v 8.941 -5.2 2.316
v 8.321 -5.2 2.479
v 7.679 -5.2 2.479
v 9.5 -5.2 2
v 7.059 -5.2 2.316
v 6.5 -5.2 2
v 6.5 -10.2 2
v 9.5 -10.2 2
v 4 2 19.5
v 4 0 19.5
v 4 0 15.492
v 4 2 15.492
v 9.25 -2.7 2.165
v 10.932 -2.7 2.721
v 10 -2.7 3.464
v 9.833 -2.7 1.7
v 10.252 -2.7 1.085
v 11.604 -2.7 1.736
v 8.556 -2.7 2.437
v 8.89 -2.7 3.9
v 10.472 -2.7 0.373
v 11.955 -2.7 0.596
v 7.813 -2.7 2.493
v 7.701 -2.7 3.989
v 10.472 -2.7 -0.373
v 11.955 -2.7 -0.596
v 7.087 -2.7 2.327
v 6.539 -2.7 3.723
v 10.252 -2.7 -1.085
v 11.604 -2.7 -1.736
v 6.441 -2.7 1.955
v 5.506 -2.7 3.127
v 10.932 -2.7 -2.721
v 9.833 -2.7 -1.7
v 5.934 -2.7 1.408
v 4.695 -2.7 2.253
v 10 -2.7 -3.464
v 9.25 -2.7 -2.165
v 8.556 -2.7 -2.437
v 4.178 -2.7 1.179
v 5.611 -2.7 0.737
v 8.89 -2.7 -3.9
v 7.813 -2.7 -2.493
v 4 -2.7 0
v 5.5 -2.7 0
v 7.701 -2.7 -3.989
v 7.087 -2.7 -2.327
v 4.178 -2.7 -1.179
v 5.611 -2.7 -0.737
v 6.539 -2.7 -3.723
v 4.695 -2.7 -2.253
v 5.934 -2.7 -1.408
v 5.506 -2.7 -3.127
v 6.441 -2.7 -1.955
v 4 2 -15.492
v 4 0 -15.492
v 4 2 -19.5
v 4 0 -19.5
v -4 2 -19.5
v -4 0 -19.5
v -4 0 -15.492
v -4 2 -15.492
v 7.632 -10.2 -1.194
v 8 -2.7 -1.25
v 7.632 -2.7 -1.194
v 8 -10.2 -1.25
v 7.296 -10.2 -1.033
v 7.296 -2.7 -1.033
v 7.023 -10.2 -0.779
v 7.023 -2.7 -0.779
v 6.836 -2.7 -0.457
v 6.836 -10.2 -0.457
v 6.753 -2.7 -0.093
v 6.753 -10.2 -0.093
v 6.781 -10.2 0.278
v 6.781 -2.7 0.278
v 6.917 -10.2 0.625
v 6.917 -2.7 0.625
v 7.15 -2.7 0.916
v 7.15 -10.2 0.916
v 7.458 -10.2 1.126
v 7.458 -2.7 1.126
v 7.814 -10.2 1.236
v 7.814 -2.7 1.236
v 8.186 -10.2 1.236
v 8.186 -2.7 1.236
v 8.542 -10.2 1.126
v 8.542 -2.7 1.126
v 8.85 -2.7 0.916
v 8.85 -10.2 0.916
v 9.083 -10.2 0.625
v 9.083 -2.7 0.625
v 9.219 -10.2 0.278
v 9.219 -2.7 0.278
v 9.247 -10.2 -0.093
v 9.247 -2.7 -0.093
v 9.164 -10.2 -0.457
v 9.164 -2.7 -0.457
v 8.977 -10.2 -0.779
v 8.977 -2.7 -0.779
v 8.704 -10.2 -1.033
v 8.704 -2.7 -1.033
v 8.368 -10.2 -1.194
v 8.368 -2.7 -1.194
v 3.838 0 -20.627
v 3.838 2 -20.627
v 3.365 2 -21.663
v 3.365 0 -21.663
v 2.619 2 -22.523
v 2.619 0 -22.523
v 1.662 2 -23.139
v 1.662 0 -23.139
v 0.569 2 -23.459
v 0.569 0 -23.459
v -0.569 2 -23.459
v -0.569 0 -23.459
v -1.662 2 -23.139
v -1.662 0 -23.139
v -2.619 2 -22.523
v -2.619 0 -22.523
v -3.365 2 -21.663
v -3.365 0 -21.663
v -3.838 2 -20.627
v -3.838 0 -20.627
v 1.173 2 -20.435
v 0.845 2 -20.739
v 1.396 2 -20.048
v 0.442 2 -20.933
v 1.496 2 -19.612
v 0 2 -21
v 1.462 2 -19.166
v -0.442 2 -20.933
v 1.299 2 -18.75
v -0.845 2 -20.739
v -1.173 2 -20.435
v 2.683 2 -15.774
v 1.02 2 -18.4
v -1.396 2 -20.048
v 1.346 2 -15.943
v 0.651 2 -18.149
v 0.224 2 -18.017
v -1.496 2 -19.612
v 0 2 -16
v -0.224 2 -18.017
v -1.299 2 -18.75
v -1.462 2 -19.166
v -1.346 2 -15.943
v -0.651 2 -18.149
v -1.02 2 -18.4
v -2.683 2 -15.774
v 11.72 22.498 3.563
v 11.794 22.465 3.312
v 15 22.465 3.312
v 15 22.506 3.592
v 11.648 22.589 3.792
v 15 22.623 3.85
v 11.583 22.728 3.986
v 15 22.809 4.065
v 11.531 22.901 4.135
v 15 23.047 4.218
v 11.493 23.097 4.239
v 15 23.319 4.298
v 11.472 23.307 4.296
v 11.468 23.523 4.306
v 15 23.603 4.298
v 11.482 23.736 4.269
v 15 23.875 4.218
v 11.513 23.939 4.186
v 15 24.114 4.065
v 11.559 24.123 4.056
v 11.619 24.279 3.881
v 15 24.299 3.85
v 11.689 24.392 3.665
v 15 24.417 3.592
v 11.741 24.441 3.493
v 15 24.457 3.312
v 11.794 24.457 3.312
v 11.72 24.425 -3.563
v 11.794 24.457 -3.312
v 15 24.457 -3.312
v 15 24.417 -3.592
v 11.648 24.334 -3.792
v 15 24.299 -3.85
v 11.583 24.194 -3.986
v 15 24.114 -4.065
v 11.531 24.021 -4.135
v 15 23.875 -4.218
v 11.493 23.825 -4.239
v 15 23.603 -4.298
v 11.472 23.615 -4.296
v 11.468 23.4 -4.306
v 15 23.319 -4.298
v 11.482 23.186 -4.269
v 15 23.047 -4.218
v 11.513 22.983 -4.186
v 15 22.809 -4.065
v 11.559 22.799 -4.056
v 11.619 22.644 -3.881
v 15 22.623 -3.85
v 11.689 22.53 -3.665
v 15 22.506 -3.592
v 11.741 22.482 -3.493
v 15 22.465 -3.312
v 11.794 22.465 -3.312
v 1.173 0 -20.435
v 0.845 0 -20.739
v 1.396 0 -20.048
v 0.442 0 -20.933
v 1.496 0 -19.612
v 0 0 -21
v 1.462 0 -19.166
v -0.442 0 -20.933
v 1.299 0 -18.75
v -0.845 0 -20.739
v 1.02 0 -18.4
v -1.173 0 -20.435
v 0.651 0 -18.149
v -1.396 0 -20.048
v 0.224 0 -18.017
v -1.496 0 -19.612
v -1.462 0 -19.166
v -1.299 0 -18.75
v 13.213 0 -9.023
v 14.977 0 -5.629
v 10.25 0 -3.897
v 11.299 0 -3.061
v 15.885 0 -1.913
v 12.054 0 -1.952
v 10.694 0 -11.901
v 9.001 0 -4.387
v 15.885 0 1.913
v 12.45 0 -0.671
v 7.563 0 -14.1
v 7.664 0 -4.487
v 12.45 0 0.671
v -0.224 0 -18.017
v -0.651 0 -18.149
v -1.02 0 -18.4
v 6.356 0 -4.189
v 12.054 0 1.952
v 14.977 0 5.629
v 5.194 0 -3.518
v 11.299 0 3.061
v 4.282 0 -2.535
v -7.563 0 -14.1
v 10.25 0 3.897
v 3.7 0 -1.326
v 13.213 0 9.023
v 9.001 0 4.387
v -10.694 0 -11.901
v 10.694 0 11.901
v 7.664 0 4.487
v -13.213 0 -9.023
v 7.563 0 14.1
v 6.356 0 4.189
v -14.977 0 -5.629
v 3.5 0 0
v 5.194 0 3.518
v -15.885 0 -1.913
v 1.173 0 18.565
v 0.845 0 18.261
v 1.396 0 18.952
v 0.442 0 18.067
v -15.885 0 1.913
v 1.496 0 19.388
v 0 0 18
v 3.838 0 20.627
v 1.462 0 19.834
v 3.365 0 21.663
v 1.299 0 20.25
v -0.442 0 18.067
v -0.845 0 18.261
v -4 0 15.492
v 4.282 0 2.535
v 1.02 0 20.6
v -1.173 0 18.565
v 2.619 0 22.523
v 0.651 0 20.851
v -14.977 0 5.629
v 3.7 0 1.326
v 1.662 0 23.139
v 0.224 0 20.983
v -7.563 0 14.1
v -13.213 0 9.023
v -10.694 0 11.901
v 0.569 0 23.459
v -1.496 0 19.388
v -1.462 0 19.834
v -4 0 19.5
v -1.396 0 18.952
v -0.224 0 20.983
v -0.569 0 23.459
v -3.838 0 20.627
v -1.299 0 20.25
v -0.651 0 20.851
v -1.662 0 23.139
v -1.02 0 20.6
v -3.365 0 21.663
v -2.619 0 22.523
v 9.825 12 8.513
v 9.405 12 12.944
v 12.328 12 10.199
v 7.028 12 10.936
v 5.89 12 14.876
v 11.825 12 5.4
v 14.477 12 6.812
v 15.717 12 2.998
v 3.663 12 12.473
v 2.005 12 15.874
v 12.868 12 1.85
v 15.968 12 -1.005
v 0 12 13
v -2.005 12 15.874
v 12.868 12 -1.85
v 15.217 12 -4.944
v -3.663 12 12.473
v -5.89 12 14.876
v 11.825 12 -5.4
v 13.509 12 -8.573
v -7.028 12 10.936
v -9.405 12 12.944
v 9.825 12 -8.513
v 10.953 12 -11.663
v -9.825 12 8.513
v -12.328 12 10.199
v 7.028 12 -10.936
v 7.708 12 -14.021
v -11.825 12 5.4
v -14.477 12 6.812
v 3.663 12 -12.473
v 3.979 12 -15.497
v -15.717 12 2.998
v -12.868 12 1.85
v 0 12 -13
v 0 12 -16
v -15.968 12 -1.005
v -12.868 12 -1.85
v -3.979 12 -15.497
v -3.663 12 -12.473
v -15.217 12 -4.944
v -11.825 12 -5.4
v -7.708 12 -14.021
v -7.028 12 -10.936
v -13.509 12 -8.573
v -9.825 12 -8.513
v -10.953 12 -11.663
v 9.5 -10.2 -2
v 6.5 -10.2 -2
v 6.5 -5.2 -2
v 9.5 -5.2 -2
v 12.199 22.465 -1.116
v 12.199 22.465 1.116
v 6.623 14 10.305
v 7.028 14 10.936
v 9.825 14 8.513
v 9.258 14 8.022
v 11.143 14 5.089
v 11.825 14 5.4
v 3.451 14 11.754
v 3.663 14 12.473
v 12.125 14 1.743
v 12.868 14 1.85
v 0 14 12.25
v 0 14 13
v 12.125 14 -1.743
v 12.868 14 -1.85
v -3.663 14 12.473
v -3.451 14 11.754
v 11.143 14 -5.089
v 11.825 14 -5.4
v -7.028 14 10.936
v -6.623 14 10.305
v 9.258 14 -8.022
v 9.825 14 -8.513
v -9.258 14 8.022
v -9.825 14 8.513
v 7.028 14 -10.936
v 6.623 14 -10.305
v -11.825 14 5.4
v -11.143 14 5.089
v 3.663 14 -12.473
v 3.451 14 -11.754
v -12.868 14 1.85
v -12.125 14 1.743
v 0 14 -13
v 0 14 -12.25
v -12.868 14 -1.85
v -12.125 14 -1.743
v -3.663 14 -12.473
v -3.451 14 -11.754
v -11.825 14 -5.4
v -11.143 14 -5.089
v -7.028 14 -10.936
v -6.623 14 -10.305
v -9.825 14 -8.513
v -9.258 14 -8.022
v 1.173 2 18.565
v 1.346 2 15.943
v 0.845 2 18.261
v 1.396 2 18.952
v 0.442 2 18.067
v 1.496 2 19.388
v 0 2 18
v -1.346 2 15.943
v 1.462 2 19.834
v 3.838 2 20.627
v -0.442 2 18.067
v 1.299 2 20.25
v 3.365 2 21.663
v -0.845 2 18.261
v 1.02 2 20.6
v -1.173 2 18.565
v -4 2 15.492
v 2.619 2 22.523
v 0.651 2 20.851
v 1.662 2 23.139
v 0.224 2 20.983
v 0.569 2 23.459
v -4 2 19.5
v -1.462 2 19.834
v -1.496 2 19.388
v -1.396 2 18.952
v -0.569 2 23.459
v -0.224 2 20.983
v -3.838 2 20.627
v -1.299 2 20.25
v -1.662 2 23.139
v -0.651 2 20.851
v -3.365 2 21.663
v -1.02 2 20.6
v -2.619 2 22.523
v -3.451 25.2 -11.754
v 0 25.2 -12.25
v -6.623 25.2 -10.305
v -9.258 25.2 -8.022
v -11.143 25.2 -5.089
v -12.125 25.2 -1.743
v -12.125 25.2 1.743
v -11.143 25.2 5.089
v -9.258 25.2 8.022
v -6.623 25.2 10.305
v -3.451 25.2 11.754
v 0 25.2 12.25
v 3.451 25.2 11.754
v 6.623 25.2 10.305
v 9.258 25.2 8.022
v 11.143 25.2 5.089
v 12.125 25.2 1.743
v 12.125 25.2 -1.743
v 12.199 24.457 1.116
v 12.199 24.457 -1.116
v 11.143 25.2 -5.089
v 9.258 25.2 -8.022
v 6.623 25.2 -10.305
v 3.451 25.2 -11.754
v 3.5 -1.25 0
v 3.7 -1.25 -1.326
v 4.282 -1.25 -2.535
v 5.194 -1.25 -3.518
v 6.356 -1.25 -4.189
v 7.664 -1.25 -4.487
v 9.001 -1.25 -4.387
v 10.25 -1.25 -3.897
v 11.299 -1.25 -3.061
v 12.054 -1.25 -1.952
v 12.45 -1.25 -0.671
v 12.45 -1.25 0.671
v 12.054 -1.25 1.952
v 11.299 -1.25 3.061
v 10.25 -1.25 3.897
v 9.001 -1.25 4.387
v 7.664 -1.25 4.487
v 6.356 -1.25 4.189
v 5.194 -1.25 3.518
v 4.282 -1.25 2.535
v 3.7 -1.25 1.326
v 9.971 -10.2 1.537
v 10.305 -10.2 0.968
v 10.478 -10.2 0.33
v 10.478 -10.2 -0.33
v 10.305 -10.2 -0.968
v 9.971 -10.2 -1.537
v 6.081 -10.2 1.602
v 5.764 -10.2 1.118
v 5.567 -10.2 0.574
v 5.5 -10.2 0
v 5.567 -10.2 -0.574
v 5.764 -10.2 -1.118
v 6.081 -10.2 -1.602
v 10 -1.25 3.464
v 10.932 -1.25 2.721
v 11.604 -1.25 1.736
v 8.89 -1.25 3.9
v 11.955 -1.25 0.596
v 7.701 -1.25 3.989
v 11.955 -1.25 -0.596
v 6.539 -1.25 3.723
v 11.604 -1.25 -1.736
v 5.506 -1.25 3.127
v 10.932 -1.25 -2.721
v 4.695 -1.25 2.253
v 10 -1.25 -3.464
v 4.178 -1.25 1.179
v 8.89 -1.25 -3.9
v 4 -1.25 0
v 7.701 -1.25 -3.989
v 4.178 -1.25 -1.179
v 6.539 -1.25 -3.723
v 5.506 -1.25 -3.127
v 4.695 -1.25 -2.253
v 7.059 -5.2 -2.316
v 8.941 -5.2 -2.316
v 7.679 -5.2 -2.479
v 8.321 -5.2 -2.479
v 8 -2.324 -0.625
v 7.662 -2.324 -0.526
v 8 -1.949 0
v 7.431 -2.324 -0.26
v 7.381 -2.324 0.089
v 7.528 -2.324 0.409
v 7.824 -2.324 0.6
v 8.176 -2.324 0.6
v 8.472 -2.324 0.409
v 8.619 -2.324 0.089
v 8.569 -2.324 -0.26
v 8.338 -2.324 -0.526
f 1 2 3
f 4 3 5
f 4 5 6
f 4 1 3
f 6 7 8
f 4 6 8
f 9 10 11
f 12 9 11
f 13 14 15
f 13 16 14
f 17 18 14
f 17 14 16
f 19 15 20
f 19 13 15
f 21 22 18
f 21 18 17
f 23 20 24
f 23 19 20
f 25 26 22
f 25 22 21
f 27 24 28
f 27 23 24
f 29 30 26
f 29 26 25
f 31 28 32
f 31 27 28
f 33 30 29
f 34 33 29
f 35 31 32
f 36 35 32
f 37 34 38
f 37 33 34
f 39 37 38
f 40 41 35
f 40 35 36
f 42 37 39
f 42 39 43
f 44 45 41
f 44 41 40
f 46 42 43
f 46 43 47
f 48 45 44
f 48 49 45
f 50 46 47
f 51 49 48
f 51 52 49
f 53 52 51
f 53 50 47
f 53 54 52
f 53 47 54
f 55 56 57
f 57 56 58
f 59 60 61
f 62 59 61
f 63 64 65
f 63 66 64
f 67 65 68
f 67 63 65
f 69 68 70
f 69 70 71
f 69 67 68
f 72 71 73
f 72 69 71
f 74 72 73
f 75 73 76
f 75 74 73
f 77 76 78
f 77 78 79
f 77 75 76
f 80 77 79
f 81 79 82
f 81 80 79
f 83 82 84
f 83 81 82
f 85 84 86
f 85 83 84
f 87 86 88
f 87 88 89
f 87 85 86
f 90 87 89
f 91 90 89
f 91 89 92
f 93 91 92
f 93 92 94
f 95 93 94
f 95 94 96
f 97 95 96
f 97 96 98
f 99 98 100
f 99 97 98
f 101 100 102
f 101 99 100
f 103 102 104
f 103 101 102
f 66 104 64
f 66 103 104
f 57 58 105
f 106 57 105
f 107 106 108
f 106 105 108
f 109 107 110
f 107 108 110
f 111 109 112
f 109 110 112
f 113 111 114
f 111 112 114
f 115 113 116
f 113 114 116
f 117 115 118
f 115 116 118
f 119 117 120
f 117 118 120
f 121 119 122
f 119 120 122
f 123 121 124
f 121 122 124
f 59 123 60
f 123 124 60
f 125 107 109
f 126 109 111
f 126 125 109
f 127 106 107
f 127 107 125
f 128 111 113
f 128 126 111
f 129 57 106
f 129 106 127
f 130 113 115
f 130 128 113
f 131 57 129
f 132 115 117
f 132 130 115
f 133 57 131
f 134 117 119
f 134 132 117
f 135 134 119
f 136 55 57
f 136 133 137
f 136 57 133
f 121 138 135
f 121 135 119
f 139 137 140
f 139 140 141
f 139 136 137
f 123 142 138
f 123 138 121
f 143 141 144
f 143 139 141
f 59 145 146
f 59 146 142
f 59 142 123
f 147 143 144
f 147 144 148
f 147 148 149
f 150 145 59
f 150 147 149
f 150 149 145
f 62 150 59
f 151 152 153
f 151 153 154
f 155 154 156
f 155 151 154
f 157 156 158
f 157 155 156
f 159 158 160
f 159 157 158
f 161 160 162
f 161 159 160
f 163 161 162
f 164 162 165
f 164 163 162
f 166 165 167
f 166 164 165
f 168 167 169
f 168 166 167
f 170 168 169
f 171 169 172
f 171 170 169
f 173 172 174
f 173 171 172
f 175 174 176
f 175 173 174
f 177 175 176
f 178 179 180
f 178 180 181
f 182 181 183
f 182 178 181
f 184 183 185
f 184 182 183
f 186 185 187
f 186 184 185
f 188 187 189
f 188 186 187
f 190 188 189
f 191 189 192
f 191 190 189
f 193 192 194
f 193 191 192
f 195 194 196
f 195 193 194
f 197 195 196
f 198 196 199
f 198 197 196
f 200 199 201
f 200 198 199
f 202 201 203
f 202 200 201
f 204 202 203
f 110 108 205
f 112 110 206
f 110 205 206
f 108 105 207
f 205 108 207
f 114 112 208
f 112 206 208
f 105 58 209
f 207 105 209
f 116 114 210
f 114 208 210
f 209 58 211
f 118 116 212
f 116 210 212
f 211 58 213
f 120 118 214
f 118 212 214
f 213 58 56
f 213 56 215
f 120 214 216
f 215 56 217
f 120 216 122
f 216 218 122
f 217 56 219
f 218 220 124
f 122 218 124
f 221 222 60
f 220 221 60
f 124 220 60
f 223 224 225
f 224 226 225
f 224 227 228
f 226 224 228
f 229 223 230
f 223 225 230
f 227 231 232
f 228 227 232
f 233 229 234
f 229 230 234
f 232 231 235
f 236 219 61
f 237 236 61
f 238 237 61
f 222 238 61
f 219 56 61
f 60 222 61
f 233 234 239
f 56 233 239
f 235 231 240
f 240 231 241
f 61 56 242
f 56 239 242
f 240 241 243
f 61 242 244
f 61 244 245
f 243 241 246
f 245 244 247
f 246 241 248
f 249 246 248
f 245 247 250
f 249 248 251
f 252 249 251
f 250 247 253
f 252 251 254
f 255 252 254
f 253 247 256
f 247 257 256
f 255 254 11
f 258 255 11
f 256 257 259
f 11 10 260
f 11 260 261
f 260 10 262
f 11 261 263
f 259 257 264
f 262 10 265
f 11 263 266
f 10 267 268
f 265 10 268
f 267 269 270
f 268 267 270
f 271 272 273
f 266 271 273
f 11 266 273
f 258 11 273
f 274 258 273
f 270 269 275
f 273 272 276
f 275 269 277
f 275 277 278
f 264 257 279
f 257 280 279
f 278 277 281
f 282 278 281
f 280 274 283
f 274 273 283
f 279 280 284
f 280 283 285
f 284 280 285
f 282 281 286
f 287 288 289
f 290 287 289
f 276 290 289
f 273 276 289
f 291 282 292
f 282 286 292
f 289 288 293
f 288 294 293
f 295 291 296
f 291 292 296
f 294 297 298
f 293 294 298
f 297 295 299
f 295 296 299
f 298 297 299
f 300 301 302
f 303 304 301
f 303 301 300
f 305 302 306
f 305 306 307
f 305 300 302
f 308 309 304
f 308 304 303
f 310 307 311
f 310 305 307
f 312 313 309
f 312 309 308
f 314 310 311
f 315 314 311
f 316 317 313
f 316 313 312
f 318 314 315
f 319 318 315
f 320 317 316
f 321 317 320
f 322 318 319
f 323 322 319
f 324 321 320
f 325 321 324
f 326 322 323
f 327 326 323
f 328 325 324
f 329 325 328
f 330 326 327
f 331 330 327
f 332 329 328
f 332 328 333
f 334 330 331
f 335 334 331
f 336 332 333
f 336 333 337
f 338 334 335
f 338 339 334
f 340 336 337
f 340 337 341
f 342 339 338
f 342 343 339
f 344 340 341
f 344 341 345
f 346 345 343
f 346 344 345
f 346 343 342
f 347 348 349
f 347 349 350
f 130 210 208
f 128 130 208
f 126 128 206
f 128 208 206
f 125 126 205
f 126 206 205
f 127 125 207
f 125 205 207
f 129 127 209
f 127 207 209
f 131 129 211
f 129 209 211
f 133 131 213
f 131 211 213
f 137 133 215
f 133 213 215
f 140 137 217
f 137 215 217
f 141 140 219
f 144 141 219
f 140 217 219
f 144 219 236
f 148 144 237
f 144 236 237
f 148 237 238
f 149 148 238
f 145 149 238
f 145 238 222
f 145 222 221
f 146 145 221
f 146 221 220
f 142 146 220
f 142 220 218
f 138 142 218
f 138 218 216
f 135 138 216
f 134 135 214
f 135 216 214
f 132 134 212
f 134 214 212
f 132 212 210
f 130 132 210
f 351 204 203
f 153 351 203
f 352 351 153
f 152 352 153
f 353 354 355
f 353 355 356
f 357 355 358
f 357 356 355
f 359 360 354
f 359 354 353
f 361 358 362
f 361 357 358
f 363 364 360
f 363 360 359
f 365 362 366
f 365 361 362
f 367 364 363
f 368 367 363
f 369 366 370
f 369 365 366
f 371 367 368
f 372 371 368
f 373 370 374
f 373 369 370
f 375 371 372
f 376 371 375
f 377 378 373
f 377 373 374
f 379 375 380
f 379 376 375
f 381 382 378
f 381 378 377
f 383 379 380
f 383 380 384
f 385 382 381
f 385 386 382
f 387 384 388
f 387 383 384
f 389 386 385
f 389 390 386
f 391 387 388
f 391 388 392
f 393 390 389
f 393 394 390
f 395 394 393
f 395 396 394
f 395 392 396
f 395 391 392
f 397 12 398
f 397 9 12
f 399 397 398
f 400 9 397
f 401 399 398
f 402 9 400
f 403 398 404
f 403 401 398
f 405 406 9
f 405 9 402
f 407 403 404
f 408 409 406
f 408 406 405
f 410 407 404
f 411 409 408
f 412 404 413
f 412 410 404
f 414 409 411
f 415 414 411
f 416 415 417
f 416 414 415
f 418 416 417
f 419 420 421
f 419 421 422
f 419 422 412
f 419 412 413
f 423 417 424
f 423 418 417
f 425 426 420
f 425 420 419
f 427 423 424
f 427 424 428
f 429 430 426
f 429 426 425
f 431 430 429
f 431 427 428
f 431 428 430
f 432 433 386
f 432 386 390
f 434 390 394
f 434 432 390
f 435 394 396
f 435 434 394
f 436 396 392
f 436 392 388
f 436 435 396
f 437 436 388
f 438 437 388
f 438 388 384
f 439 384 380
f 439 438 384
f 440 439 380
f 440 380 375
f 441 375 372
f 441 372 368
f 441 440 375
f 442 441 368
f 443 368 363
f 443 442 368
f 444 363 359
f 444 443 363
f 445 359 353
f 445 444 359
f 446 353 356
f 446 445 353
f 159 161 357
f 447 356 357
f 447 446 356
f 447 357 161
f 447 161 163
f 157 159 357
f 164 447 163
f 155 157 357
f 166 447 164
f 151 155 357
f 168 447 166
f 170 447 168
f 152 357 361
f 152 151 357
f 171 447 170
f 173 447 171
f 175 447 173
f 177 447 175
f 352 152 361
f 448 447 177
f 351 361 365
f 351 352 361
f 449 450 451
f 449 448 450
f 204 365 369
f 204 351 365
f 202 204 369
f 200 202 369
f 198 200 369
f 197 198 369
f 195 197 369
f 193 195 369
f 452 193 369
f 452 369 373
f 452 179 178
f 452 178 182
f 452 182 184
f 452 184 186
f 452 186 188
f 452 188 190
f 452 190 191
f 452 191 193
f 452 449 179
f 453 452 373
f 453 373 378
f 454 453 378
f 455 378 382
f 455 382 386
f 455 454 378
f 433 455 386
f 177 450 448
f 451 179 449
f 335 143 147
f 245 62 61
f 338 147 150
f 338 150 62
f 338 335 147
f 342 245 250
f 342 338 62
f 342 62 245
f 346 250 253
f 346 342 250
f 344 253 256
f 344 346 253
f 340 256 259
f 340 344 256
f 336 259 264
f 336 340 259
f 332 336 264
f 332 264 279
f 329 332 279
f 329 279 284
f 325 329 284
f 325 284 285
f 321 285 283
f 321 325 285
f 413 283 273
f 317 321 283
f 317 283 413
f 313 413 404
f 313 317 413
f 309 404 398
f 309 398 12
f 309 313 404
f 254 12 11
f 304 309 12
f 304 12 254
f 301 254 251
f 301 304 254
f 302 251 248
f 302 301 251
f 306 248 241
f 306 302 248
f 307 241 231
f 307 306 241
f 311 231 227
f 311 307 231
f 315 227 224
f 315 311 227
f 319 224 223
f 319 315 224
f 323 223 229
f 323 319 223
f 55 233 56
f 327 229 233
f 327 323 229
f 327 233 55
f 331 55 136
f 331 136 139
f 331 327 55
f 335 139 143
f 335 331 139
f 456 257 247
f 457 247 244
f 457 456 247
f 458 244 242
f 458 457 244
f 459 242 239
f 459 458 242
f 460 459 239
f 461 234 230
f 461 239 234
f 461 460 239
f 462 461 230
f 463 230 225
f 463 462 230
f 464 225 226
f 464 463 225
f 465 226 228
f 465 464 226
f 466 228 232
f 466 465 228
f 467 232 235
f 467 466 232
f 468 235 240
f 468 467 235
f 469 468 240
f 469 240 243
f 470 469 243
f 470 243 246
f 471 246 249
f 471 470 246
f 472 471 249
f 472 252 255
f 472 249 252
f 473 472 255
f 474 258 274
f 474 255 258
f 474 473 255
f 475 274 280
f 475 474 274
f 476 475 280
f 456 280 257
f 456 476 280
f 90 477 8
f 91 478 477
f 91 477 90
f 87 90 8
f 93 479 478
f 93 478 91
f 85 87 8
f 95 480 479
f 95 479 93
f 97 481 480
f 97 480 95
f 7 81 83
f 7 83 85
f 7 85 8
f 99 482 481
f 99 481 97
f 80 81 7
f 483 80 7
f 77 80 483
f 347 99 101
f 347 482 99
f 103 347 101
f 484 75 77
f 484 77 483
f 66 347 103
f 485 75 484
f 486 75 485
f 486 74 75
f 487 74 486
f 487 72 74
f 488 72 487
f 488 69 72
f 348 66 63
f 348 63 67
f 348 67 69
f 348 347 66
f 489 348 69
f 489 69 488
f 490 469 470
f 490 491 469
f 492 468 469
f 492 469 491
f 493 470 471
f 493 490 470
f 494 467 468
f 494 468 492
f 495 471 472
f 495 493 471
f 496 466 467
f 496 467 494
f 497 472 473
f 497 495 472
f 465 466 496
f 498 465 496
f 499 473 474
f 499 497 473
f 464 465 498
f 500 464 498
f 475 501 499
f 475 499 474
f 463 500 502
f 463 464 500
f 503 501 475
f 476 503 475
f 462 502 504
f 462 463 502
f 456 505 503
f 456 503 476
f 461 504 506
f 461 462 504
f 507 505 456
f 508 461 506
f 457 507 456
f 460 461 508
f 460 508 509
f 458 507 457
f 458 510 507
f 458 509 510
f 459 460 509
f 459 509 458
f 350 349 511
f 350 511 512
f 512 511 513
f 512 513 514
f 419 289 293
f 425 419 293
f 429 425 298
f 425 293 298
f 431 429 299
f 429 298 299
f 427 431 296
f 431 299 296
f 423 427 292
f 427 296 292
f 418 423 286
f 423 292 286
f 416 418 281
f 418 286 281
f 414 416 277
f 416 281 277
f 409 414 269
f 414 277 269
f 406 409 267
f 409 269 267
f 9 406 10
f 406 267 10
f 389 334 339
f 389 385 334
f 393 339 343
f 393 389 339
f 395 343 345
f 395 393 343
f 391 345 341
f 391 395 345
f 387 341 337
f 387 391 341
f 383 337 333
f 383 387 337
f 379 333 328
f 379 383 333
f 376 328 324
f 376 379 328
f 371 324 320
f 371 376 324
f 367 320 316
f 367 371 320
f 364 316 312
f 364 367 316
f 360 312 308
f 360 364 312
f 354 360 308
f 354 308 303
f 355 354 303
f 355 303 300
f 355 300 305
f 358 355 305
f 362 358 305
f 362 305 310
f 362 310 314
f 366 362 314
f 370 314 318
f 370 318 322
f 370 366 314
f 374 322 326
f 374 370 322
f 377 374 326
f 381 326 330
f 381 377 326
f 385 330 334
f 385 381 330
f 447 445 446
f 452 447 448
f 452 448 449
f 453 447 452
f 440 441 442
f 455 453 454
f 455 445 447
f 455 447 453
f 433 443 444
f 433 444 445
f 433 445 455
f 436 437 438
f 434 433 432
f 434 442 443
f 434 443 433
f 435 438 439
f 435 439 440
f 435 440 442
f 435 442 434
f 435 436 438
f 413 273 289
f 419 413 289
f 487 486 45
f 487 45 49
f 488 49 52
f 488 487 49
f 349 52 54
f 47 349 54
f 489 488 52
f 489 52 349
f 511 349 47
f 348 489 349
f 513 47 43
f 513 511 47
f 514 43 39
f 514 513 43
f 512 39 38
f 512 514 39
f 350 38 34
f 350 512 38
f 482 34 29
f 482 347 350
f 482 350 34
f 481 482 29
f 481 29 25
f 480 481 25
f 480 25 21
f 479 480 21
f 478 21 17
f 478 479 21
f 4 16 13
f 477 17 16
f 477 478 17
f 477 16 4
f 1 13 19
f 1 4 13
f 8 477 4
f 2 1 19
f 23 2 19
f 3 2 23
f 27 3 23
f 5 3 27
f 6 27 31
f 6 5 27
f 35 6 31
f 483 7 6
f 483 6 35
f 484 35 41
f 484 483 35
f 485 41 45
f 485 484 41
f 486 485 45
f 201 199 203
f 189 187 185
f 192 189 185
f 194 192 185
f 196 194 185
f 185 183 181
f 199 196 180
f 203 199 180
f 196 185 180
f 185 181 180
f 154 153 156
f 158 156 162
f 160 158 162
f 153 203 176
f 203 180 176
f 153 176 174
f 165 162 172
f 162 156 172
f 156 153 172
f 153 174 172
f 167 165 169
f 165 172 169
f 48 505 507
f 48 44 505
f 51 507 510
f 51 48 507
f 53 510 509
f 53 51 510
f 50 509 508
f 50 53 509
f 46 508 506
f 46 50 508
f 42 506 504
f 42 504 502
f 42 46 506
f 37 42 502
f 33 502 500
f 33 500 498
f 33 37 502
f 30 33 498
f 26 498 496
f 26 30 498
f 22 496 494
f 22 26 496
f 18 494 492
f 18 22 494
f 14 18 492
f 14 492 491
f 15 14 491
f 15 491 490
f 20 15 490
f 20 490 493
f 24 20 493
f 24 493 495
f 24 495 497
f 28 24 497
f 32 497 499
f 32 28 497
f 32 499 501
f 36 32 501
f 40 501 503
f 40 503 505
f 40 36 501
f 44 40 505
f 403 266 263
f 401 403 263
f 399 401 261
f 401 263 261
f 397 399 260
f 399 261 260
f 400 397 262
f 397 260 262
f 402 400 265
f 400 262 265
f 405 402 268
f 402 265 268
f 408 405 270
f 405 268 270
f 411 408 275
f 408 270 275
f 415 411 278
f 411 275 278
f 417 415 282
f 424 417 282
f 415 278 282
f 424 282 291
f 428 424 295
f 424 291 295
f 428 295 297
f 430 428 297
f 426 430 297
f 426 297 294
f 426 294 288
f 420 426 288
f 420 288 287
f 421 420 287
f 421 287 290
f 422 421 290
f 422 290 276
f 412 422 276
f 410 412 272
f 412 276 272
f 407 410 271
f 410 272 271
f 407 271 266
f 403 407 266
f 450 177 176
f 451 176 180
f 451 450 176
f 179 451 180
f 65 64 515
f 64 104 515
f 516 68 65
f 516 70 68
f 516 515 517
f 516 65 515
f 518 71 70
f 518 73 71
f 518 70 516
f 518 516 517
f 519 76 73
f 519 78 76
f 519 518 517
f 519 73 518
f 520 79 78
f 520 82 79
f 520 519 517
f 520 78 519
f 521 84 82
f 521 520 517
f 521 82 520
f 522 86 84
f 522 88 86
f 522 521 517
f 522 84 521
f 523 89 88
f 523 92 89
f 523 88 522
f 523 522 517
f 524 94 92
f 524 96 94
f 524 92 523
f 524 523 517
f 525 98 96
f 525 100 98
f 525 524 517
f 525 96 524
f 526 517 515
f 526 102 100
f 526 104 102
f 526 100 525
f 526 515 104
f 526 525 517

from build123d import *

# Parameters (mm, degrees)
SKETCH_9_W          = 5.698212476
SKETCH_9_H          = 1.620294685
SKETCH_9_W_2        = 7.400009417
SKETCH_9_H_2        = 3.482357373
CUT_EXTRUDE_1_DEPTH = 5
SKETCH_10_R         = 1.5
EXTRUDE_5_DEPTH     = 2
EXTRUDE_6_DEPTH     = 15


with BuildPart() as part:
    # 草图3 → 旋转1 (revolve)
    with BuildSketch(Plane.XY, mode=Mode.PRIVATE) as revolve_1_sk:
        Polygon((-16, 0), (-16, 12), (-13, 12), (-13, 14), (-12.25, 14), (-12.25, 25.2), (0, 25.2), (0, 0), align=None)
    revolve(revolve_1_sk.sketch.rotate(Axis((0, 0, 0), (0, 1, 0)), 270), axis=Axis((0, 0, 0), (0, 1, 0)))



with BuildPart() as body_2:
    # 草图6 → 旋转4 (revolve)
    with BuildSketch(Plane.XY):
        Polygon((3.5, 0), (3.5, -1.25), (4, -1.25), (4, -2.7), (5.5, -2.7), (5.5, -10.2), (8, -10.2), (8, -5.2), (8, 0), align=None)
    revolve(axis=Axis((8, 0, 0), (0, -1, 0)))

    # 草图8 → M3 螺纹孔1 (revolve, cut)
    with BuildSketch(Plane(origin=(8, -10.2, 0), x_dir=(0, 0, -1), z_dir=(1, 0, 0))):
        Polygon((0, 0), (0, 8.251075774), (1.25, 7.5), (1.25, 0), align=None)
    revolve(axis=Axis((8, -16.55, 0), (0, 1, 0)), mode=Mode.SUBTRACT)

    # 草图9 → 切除-拉伸1 (cut)
    with BuildSketch(Plane.XZ.offset(10.2)):
        with Locations((8.176379841, 2.810147343)):
            Rectangle(SKETCH_9_W, SKETCH_9_H)
        with Locations((7.325481371, -3.741178687)):
            Rectangle(SKETCH_9_W_2, SKETCH_9_H_2)
    extrude(amount=-CUT_EXTRUDE_1_DEPTH, mode=Mode.SUBTRACT)


with BuildPart() as part_1:
    add(part.part)

    add(body_2.part)  # 凸台-拉伸5 merges body 2
    # 草图10 → 凸台-拉伸5 (add)
    with BuildSketch(Plane.XZ):
        with BuildLine():
            Line((-4, -19.5), (-4, 19.5))
            ThreePointArc((-4, 19.5), (0, 23.5), (4, 19.5))
            Line((4, 19.5), (4, -19.5))
            ThreePointArc((4, -19.5), (0, -23.5), (-4, -19.5))
        make_face()
        with Locations(Location((0, 19.5, 0), (0, 0, 270))):
            Circle(SKETCH_10_R, mode=Mode.SUBTRACT)
        with Locations(Location((0, -19.5, 0), (0, 0, 270))):
            Circle(SKETCH_10_R, mode=Mode.SUBTRACT)
    extrude(amount=-EXTRUDE_5_DEPTH)

    # 草图11 → 凸台-拉伸6 (add)
    with BuildSketch(Plane(origin=(0, 0, 0), x_dir=(0, 0, -1), z_dir=(1, 0, 0))):
        with BuildLine():
            Line((-3.311772074, 24.45726904), (3.311772074, 24.45726904))
            ThreePointArc((3.311772074, 24.45726904), (4.30779375, 23.461247363), (3.311772074, 22.465225687))
            Line((3.311772074, 22.465225687), (-3.311772074, 22.465225687))
            ThreePointArc((-3.311772074, 22.465225687), (-4.30779375, 23.461247363), (-3.311772074, 24.45726904))
        make_face()
    extrude(amount=EXTRUDE_6_DEPTH)


solid = part_1.part
